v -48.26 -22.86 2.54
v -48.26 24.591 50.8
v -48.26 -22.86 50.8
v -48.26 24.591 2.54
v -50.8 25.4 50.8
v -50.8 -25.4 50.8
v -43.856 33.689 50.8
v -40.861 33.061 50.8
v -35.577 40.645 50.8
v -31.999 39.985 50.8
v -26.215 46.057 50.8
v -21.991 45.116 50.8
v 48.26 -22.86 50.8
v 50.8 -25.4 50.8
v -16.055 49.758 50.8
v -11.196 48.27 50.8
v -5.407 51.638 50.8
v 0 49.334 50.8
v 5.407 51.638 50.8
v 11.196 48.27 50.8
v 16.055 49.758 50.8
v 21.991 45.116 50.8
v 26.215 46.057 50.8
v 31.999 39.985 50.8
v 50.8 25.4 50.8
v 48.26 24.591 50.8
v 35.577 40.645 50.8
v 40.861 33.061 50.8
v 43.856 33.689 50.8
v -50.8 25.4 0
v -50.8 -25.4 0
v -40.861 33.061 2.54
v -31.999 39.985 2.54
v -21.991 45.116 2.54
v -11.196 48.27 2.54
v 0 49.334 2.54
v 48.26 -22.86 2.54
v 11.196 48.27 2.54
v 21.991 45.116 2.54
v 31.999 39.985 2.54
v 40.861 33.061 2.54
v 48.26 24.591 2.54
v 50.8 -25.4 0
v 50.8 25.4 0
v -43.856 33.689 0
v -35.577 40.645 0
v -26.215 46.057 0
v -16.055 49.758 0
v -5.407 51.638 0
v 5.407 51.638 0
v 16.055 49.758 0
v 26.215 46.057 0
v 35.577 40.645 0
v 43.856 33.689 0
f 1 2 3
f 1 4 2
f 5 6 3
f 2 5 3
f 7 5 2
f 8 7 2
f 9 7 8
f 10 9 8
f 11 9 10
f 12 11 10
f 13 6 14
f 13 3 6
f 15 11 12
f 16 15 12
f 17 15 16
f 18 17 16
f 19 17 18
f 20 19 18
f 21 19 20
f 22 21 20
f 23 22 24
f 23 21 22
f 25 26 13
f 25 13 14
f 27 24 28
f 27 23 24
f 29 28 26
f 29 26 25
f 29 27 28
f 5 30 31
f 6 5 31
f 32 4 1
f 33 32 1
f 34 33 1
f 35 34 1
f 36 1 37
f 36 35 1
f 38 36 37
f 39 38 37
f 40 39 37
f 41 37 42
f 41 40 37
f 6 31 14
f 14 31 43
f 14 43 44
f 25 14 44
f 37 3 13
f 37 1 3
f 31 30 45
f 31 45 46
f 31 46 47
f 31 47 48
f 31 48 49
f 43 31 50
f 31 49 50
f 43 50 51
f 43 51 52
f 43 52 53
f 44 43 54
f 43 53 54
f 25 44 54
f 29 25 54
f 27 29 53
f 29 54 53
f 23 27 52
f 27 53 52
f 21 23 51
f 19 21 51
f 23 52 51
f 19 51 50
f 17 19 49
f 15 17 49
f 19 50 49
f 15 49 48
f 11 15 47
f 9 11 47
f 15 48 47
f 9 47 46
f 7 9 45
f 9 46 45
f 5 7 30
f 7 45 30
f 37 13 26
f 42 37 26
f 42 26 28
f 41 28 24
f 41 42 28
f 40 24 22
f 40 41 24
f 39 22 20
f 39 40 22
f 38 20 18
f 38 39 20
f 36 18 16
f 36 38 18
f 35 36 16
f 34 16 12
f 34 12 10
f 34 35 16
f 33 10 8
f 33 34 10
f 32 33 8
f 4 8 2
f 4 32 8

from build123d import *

# Parameters (mm, degrees)
F1_DEPTH = 50.8
F2_T     = -2.54


with BuildPart() as f1:
    # F0 (on Top) → F1 (new body)
    with BuildSketch(Plane.XY):
        with BuildLine():
            Line((-50.8, 25.4), (-50.8, -25.4))
            Line((-50.8, -25.4), (50.8, -25.4))
            Line((50.8, -25.4), (50.8, 25.4))
            ThreePointArc((50.8, 25.4), (0, 51.874105), (-50.8, 25.4))
        make_face()
    extrude(amount=F1_DEPTH)

    # F2
    f2_openings = [f1.faces().sort_by_distance(p)[0] for p in [
        (0, 9.695027, 50.8),
    ]]
    offset(amount=F2_T, openings=f2_openings)


solid = f1.part
